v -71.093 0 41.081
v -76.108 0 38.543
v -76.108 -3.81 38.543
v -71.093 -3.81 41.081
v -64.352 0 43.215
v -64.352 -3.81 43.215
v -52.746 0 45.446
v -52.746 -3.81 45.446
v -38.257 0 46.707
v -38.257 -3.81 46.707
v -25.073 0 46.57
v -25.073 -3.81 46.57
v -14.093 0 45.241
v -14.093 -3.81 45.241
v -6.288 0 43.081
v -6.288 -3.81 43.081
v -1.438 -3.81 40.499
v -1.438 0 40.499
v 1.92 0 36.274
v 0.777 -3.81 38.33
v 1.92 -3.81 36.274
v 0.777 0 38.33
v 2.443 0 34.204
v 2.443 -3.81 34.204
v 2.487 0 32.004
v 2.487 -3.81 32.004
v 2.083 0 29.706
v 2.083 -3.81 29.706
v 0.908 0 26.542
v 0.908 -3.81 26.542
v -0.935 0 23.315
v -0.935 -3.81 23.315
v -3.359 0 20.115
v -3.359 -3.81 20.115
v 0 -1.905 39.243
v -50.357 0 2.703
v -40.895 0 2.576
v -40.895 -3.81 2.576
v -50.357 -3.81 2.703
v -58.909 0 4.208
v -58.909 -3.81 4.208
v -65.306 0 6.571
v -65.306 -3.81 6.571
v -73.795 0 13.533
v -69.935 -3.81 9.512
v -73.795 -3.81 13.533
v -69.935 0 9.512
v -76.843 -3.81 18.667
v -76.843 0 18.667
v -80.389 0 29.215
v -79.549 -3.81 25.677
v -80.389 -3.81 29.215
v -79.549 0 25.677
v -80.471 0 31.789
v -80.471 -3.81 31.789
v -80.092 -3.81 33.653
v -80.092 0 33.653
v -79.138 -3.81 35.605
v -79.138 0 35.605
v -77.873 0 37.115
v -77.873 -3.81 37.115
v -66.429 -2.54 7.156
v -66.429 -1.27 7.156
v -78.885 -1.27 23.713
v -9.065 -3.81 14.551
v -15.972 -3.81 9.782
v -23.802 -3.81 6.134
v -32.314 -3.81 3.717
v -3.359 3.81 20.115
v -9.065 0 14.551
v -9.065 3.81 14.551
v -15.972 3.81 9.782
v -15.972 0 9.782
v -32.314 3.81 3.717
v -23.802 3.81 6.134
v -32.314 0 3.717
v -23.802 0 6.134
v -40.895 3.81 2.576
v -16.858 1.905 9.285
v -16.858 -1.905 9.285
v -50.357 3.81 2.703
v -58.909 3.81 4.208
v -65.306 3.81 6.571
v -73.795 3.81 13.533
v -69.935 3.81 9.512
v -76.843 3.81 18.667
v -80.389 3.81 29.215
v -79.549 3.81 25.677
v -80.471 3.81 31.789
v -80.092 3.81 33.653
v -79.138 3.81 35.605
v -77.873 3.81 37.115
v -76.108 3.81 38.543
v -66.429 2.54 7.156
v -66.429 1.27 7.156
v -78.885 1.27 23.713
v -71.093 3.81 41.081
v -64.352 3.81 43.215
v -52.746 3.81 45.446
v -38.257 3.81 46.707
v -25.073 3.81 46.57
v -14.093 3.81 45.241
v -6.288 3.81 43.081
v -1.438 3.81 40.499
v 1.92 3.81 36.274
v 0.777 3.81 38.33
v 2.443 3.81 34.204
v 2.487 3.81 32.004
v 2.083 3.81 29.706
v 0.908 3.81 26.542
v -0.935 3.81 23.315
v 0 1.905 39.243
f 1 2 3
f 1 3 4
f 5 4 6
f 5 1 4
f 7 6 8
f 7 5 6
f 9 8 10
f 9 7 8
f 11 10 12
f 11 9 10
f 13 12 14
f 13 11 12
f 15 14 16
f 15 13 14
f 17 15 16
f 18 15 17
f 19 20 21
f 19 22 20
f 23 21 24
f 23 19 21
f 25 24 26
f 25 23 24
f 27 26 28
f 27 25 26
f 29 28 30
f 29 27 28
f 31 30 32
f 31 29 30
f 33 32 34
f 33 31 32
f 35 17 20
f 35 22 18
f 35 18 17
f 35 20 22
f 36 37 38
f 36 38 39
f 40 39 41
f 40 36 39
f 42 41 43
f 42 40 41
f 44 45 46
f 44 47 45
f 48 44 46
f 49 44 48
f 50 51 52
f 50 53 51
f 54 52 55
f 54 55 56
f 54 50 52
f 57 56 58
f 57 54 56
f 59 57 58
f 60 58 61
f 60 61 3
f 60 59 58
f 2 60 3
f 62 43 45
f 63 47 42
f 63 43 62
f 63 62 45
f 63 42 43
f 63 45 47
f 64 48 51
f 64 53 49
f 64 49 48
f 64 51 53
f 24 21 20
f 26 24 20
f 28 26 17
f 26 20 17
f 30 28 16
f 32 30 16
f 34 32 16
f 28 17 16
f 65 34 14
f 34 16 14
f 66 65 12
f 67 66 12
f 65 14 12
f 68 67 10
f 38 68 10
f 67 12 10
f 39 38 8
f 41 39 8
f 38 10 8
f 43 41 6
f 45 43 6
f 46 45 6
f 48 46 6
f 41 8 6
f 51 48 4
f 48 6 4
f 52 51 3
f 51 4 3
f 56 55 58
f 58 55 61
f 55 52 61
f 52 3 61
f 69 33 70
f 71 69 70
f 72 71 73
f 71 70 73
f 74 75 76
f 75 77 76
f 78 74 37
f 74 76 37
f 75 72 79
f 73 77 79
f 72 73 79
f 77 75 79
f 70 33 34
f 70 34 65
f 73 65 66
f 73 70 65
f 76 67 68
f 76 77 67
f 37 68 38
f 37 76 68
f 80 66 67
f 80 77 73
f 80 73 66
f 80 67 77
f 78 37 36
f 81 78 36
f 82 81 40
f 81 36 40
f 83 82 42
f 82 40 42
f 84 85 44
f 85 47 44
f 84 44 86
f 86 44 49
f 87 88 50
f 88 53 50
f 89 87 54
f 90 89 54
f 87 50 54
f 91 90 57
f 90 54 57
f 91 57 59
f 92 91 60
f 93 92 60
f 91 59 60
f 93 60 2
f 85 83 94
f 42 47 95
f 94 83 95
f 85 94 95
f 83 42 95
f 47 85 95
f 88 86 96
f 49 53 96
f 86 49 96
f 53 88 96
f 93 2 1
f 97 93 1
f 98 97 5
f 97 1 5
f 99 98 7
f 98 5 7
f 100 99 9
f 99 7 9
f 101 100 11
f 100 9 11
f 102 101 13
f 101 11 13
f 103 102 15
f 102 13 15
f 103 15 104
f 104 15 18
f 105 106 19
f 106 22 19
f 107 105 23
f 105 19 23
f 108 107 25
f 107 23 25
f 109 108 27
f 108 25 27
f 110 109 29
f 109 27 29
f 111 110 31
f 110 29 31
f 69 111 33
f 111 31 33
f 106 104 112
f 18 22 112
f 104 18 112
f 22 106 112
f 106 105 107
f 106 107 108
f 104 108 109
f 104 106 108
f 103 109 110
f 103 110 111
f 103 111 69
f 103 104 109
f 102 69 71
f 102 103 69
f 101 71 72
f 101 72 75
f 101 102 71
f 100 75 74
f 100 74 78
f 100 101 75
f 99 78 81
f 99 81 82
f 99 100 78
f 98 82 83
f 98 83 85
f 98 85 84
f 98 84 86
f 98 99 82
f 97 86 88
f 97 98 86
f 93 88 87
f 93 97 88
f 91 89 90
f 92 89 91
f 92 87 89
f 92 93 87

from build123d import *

# Parameters (mm, degrees)
F1_DEPTH = 3.81


with BuildPart() as f1:
    # F0 (on Front) → F1 (new body, symmetric)
    with BuildSketch(Plane.XZ):
        with BuildLine():
            add(Edge.make_bspline(
                [(-3.3592153029, 20.114979987), (-6.8504877453, 16.0094498257), (-18.4079911976, 6.6593496766), (-32.8135138593, 3.0874366389), (-40.8954872018, 2.5761741089)],
                knots=[0.4115937464, 0.4115937464, 0.4115937464, 0.4115937464, 0.4851517271, 0.5901219019, 0.5901219019, 0.5901219019, 0.5901219019], degree=3))
            add(Edge.make_bspline(
                [(-36.6568307247, 12.1914259236), (-30.6486980251, 16.2774417488), (-17.3343255861, 19.1636917052), (-3.3592153048, 20.1149799915)],
                knots=[0, 0, 0, 0, 0.1278956006, 0.1278956006, 0.1278956006, 0.1278956006], degree=3))
            add(Edge.make_bspline(
                [(-40.8954872053, 2.576174108), (-41.4479875436, 6.0867174365), (-40.7380432441, 9.4158715586), (-36.6568307247, 12.1914259236)],
                knots=[0.9131229032, 0.9131229032, 0.9131229032, 0.9131229032, 1, 1, 1, 1], degree=3))
        make_face()
        with BuildLine():
            add(Edge.make_bspline(
                [(-76.1079117656, 38.5431684554), (-62.4773288295, 47.8130665032), (10.2016094215, 52.2030804941), (2.4046008218, 26.8928872785), (-3.3592153029, 20.114979987)],
                knots=[0, 0, 0, 0, 0.2901553076, 0.4115937464, 0.4115937464, 0.4115937464, 0.4115937464], degree=3))
            add(Edge.make_bspline(
                [(-40.8954872018, 2.5761741089), (-50.8508917239, 1.9463990418), (-71.1835766287, 5.8129647851), (-79.1669210684, 22.793330039), (-82.1768176013, 34.4158219858), (-76.1079117656, 38.5431684554)],
                knots=[0.5901219019, 0.5901219019, 0.5901219019, 0.5901219019, 0.7194245497, 0.8708107168, 1, 1, 1, 1], degree=3))
            add(Edge.make_bspline(
                [(-40.8954872053, 2.576174108), (-41.4479875436, 6.0867174365), (-40.7380432441, 9.4158715586), (-36.6568307247, 12.1914259236)],
                knots=[0.9131229032, 0.9131229032, 0.9131229032, 0.9131229032, 1, 1, 1, 1], degree=3))
            add(Edge.make_bspline(
                [(-36.6568307247, 12.1914259236), (-30.6486980251, 16.2774417488), (-17.3343255861, 19.1636917052), (-3.3592153048, 20.1149799915)],
                knots=[0, 0, 0, 0, 0.1278956006, 0.1278956006, 0.1278956006, 0.1278956006], degree=3))
        make_face()
    extrude(amount=F1_DEPTH, both=True)


solid = f1.part
